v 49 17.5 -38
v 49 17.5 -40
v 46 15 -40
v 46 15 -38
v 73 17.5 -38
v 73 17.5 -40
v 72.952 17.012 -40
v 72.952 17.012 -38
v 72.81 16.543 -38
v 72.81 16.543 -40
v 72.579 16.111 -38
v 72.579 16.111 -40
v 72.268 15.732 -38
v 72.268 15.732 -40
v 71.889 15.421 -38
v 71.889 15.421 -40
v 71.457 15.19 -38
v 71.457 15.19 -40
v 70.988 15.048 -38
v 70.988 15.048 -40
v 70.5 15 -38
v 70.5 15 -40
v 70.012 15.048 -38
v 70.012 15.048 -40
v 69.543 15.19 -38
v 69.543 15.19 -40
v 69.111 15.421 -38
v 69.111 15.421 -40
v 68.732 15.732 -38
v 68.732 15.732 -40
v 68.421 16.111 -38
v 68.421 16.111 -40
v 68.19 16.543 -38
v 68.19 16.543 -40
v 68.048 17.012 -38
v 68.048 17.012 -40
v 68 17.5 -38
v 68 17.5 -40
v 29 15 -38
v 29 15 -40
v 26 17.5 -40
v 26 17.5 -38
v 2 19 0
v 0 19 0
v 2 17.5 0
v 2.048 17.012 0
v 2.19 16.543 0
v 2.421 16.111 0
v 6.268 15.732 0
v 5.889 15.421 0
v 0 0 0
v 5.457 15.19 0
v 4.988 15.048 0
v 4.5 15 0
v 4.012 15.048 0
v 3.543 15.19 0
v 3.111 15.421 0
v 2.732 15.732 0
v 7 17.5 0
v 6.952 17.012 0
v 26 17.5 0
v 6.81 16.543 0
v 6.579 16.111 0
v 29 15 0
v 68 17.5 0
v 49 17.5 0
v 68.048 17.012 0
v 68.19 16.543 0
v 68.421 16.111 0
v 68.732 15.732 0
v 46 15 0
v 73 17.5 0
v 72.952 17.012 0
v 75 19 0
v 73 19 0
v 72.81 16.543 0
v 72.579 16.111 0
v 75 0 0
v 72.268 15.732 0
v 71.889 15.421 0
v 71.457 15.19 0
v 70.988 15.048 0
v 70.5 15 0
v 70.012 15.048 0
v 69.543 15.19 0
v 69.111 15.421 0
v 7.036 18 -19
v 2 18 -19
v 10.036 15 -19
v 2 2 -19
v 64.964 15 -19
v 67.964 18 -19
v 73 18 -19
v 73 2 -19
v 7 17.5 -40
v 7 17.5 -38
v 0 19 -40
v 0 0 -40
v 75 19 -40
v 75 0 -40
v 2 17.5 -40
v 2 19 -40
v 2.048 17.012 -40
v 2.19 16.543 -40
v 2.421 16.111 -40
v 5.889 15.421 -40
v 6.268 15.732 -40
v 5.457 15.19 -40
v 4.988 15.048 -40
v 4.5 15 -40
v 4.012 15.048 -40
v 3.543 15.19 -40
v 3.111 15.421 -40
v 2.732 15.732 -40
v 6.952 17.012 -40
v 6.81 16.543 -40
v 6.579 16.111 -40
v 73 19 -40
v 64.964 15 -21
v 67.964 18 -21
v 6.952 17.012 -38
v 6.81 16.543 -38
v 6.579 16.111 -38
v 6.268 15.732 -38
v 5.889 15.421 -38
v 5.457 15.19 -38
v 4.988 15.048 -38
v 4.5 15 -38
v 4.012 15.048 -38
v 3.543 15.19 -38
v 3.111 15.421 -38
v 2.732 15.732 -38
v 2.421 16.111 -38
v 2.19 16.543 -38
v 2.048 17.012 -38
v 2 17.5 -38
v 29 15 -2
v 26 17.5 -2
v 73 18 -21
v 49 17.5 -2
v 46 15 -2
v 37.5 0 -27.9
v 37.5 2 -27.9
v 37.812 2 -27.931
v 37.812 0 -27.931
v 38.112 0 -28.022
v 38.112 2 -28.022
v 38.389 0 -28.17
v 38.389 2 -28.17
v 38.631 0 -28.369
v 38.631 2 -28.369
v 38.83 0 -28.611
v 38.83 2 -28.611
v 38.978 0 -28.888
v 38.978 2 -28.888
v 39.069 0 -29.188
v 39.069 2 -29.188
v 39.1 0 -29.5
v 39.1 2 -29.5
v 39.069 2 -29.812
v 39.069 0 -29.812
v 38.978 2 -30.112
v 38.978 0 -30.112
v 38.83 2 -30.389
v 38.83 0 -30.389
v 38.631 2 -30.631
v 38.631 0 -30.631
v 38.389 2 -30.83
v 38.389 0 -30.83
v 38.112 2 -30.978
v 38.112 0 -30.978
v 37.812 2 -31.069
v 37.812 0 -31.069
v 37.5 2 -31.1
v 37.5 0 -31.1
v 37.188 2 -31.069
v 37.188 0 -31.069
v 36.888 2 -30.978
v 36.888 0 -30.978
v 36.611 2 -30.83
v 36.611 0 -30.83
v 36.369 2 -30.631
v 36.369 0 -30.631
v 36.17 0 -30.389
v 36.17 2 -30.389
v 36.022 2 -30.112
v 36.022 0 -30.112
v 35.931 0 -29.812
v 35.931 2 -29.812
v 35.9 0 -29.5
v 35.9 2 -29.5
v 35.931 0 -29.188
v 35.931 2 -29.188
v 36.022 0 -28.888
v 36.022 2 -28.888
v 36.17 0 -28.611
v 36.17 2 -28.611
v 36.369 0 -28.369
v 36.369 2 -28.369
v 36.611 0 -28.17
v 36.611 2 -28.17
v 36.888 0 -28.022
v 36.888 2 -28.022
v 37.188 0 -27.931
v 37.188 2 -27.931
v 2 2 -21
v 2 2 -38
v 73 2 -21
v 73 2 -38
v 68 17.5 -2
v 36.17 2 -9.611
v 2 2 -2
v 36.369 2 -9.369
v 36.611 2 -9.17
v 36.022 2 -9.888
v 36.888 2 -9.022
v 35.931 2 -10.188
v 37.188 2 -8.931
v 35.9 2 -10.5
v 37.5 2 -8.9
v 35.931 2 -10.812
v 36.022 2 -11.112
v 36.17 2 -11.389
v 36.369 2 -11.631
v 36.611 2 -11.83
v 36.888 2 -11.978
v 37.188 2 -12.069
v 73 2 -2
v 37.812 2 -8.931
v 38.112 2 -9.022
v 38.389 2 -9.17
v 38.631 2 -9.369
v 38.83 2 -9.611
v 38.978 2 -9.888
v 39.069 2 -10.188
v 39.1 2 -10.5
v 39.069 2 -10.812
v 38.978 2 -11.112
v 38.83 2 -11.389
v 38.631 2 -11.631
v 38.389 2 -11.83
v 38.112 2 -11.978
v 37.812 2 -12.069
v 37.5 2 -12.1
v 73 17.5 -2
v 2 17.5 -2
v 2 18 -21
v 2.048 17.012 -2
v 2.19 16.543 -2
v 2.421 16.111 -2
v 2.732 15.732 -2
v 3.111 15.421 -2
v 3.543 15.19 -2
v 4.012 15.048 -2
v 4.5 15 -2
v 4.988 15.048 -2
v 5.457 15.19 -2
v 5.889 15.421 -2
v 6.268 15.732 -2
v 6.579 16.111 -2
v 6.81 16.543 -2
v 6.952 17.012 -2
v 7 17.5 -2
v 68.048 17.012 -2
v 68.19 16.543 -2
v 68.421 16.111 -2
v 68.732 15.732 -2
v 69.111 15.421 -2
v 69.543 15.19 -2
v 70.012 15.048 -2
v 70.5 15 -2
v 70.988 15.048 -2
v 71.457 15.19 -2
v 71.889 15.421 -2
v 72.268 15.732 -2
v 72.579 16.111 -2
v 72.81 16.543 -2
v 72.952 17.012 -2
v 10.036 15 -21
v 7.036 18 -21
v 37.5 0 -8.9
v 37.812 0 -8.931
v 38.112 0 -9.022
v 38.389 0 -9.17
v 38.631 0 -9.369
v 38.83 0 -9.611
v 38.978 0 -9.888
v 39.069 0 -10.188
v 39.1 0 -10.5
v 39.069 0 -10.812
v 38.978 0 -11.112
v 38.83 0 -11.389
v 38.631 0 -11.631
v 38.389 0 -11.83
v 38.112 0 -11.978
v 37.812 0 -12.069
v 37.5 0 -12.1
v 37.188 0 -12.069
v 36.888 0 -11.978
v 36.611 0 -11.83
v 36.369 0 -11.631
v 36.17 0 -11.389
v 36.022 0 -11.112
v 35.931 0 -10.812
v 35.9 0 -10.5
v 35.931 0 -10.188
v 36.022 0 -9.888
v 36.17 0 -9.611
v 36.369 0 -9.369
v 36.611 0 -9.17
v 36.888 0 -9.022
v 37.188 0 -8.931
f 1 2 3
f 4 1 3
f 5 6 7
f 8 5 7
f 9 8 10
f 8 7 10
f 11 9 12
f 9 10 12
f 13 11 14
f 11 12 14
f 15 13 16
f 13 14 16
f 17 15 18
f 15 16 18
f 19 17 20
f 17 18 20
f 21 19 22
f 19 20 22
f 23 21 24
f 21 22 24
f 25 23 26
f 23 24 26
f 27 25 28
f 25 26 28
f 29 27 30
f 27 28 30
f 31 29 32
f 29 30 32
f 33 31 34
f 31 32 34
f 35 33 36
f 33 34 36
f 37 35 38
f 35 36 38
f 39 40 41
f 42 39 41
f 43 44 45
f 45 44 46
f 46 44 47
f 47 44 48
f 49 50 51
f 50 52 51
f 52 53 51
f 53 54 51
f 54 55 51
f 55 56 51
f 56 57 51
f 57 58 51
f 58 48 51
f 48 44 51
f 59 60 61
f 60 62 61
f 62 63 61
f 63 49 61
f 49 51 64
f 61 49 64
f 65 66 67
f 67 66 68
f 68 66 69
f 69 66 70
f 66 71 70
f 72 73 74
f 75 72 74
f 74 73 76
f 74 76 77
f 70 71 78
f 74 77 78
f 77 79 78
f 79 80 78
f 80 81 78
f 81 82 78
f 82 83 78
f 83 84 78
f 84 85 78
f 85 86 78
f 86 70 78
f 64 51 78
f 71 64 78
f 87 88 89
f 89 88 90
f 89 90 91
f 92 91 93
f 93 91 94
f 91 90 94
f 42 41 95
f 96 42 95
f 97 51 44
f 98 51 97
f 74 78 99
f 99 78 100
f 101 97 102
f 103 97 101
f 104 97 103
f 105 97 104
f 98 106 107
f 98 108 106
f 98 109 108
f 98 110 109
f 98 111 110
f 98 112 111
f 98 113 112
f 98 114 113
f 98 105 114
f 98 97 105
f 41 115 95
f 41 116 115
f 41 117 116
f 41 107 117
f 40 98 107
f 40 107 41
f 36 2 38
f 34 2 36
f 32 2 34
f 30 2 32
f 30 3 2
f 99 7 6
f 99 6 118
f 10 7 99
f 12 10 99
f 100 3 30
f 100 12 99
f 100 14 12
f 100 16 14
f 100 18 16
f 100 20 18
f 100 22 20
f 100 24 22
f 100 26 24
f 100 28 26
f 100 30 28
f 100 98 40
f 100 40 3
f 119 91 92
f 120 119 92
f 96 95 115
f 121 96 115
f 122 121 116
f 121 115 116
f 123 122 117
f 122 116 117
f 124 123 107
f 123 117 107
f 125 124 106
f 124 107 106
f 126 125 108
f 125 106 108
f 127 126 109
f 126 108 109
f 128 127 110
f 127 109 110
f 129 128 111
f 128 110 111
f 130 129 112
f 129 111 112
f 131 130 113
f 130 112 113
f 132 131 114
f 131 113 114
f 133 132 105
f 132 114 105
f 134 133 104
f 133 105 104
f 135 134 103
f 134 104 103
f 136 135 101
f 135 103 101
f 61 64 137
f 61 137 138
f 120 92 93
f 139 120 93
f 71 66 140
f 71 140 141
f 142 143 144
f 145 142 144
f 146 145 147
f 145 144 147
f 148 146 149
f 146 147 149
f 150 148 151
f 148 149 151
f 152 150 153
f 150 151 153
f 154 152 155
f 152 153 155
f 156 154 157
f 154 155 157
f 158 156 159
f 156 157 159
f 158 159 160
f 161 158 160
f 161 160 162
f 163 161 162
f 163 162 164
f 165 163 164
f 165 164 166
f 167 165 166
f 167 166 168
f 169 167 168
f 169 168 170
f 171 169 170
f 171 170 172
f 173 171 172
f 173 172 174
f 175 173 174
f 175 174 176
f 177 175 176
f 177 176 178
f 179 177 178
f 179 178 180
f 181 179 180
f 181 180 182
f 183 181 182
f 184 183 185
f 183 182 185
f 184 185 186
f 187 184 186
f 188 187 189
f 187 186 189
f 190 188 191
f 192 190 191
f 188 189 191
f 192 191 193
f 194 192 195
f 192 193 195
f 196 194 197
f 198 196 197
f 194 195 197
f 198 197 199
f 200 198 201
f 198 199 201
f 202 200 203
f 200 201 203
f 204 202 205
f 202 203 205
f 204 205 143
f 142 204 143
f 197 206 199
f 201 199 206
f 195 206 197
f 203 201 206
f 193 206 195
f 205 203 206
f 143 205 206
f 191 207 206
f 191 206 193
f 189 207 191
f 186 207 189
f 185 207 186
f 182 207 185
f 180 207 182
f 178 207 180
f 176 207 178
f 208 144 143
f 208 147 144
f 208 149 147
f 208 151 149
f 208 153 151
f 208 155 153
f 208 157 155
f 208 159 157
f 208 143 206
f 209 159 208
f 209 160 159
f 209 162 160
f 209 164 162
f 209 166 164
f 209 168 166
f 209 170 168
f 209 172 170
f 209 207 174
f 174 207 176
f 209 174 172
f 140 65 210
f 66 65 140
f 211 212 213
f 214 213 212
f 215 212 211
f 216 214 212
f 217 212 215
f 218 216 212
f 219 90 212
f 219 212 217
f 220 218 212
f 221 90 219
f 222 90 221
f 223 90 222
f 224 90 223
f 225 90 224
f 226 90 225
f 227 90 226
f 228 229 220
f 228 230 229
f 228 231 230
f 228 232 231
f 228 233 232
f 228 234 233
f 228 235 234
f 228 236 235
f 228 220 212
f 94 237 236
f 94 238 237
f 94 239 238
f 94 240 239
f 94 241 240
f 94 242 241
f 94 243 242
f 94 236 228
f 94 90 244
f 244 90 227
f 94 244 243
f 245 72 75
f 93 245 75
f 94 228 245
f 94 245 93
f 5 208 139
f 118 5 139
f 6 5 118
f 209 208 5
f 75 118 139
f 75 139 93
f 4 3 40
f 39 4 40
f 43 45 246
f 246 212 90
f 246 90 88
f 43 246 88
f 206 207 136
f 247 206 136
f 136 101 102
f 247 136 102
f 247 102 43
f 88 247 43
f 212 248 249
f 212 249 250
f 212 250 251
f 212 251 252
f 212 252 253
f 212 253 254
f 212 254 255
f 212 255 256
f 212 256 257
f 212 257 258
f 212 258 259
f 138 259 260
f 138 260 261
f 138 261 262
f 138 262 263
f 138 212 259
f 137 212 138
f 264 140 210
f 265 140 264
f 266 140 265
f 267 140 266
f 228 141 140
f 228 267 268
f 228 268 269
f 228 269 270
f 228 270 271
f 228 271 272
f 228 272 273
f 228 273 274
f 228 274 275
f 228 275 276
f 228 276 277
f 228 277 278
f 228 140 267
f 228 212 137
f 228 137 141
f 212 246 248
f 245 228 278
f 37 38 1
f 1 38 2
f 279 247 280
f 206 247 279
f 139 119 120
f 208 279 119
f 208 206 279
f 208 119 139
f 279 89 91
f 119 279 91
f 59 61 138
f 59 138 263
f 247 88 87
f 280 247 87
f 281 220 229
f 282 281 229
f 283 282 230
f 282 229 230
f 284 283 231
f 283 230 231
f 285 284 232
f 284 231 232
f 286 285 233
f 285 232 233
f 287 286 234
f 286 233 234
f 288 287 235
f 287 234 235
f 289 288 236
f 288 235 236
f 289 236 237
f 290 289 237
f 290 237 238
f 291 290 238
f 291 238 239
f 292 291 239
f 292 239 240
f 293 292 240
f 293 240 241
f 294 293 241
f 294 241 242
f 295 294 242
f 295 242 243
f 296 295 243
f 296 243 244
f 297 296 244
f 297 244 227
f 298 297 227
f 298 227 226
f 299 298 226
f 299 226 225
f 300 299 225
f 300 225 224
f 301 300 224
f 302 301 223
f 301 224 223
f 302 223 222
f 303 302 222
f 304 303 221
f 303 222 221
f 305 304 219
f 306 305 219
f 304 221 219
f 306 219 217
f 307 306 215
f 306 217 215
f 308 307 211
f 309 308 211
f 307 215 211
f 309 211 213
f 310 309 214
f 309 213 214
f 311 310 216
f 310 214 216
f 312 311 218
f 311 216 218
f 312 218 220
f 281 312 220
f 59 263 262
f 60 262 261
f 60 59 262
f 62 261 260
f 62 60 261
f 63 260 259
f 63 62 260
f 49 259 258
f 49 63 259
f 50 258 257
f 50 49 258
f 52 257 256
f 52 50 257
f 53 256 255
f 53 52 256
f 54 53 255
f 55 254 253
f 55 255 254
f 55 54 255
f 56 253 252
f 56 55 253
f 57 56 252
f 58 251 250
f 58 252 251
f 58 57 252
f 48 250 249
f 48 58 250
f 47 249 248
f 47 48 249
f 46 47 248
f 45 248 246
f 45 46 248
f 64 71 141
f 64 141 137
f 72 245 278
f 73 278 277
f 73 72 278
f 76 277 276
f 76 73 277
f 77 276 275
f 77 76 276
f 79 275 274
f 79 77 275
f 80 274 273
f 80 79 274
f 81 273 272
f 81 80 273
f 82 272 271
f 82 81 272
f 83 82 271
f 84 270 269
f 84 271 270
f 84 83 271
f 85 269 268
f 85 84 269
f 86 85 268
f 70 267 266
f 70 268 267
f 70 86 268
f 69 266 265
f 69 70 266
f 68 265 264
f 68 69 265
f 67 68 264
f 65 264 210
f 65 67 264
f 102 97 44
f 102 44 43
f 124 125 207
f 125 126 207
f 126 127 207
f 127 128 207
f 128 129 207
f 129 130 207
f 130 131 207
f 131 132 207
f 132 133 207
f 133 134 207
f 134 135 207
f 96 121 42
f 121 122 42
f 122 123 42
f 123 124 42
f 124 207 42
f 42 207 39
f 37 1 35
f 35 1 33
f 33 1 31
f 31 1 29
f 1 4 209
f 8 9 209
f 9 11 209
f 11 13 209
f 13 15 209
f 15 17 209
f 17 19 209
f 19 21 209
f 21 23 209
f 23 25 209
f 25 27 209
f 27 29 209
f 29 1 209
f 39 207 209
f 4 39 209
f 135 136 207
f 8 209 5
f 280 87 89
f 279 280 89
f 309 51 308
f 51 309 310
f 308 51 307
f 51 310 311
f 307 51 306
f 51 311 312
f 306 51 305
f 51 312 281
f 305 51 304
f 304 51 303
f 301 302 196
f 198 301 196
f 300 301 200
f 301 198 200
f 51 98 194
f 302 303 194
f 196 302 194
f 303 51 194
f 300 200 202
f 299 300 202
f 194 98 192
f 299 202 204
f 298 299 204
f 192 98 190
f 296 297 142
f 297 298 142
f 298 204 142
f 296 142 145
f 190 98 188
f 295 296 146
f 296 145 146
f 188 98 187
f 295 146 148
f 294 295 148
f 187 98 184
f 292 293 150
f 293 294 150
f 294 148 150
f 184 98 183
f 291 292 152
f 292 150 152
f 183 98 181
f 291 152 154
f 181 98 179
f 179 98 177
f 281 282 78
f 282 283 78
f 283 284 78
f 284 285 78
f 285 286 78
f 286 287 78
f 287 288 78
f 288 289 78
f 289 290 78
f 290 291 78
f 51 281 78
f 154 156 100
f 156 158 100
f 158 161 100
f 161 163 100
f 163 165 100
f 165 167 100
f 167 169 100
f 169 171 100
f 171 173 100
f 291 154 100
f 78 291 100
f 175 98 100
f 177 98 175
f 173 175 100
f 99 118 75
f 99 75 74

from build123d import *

# Parameters (mm, degrees)
SKETCH1_W           = 75
SKETCH1_H           = 40
BOSS_EXTRUDE1_DEPTH = 2
SKETCH2_W           = 75
SKETCH2_H           = 40
SKETCH2_W_2         = 71
SKETCH2_H_2         = 17
BOSS_EXTRUDE2_DEPTH = 17
CUT_EXTRUDE2_DEPTH  = 17
CUT_EXTRUDE3_REACH  = 82.169
CUT_EXTRUDE4_REACH  = 88.683
SKETCH5_R           = 1.6


with BuildPart() as part:
    # Sketch1 → Boss-Extrude1 (new body)
    with BuildSketch(Plane(origin=(0, 0, 0), x_dir=(1, 0, 0), z_dir=(0, 1, 0))):
        with Locations((37.5, 20)):
            Rectangle(SKETCH1_W, SKETCH1_H)
    extrude(amount=BOSS_EXTRUDE1_DEPTH)

    # Sketch2 → Boss-Extrude2 (add)
    with BuildSketch(Plane(origin=(0, 2, 0), x_dir=(1, 0, 0), z_dir=(0, 1, 0))):
        with Locations((37.5, 20)):
            Rectangle(SKETCH2_W, SKETCH2_H)
        with Locations((37.5, 29.5)):
            Rectangle(SKETCH2_W_2, SKETCH2_H_2, mode=Mode.SUBTRACT)
        with Locations((37.5, 10.5)):
            Rectangle(SKETCH2_W_2, SKETCH2_H_2, mode=Mode.SUBTRACT)
    extrude(amount=BOSS_EXTRUDE2_DEPTH)

    # Sketch3 → Cut-Extrude2 (cut)
    with BuildSketch(Plane.XY):
        with BuildLine():
            Line((2, 17.5), (2, 19))
            Line((2, 19), (73, 19))
            Line((73, 19), (73, 17.5))
            ThreePointArc((73, 17.5), (70.5, 15), (68, 17.5))
            Line((68, 17.5), (49, 17.5))
            Line((49, 17.5), (46, 15))
            Line((46, 15), (29, 15))
            Line((29, 15), (26, 17.5))
            Line((26, 17.5), (7, 17.5))
            ThreePointArc((7, 17.5), (4.5, 15), (2, 17.5))
        make_face()
    cut_extrude2 = extrude(amount=-CUT_EXTRUDE2_DEPTH, mode=Mode.SUBTRACT)

    # Mirror1: Cut-Extrude2 across plane
    add(cut_extrude2.mirror(Plane.XY.offset(-20)), mode=Mode.SUBTRACT)

    # Sketch4 → Cut-Extrude3 (cut, up to next)
    with BuildSketch(Plane.XY.offset(-19), mode=Mode.PRIVATE) as cut_extrude3_sk1:
        Polygon((2, 18), (7.035918341, 18), (10.035918341, 15), (64.964081659, 15), (67.964081659, 18), (73, 18), (73, 19), (2, 19), align=None)
    cut_extrude3_tool1 = extrude(cut_extrude3_sk1.sketch, amount=-CUT_EXTRUDE3_REACH, mode=Mode.PRIVATE) & part.part
    add(cut_extrude3_tool1.solids().sort_by_distance((37.5, 17.098486, -19))[0], mode=Mode.SUBTRACT)

    # Sketch5 → Cut-Extrude4 (cut, up to next)
    with BuildSketch(Plane(origin=(0, 2, 0), x_dir=(1, 0, 0), z_dir=(0, 1, 0)), mode=Mode.PRIVATE) as cut_extrude4_sk1:
        with Locations(Location((37.5, 29.5, 0), (0, 0, 270))):
            Circle(SKETCH5_R)
    cut_extrude4_tool1 = extrude(cut_extrude4_sk1.sketch, amount=-CUT_EXTRUDE4_REACH, mode=Mode.PRIVATE) & part.part
    # Sketch5 → Cut-Extrude4 (cut, up to next)
    with BuildSketch(Plane(origin=(0, 2, 0), x_dir=(1, 0, 0), z_dir=(0, 1, 0)), mode=Mode.PRIVATE) as cut_extrude4_sk2:
        with Locations(Location((37.5, 10.5, 0), (0, 0, 270))):
            Circle(SKETCH5_R)
    cut_extrude4_tool2 = extrude(cut_extrude4_sk2.sketch, amount=-CUT_EXTRUDE4_REACH, mode=Mode.PRIVATE) & part.part
    add(cut_extrude4_tool1.solids().sort_by_distance((37.5, 2, -29.5))[0], mode=Mode.SUBTRACT)
    add(cut_extrude4_tool2.solids().sort_by_distance((37.5, 2, -10.5))[0], mode=Mode.SUBTRACT)


solid = part.part
